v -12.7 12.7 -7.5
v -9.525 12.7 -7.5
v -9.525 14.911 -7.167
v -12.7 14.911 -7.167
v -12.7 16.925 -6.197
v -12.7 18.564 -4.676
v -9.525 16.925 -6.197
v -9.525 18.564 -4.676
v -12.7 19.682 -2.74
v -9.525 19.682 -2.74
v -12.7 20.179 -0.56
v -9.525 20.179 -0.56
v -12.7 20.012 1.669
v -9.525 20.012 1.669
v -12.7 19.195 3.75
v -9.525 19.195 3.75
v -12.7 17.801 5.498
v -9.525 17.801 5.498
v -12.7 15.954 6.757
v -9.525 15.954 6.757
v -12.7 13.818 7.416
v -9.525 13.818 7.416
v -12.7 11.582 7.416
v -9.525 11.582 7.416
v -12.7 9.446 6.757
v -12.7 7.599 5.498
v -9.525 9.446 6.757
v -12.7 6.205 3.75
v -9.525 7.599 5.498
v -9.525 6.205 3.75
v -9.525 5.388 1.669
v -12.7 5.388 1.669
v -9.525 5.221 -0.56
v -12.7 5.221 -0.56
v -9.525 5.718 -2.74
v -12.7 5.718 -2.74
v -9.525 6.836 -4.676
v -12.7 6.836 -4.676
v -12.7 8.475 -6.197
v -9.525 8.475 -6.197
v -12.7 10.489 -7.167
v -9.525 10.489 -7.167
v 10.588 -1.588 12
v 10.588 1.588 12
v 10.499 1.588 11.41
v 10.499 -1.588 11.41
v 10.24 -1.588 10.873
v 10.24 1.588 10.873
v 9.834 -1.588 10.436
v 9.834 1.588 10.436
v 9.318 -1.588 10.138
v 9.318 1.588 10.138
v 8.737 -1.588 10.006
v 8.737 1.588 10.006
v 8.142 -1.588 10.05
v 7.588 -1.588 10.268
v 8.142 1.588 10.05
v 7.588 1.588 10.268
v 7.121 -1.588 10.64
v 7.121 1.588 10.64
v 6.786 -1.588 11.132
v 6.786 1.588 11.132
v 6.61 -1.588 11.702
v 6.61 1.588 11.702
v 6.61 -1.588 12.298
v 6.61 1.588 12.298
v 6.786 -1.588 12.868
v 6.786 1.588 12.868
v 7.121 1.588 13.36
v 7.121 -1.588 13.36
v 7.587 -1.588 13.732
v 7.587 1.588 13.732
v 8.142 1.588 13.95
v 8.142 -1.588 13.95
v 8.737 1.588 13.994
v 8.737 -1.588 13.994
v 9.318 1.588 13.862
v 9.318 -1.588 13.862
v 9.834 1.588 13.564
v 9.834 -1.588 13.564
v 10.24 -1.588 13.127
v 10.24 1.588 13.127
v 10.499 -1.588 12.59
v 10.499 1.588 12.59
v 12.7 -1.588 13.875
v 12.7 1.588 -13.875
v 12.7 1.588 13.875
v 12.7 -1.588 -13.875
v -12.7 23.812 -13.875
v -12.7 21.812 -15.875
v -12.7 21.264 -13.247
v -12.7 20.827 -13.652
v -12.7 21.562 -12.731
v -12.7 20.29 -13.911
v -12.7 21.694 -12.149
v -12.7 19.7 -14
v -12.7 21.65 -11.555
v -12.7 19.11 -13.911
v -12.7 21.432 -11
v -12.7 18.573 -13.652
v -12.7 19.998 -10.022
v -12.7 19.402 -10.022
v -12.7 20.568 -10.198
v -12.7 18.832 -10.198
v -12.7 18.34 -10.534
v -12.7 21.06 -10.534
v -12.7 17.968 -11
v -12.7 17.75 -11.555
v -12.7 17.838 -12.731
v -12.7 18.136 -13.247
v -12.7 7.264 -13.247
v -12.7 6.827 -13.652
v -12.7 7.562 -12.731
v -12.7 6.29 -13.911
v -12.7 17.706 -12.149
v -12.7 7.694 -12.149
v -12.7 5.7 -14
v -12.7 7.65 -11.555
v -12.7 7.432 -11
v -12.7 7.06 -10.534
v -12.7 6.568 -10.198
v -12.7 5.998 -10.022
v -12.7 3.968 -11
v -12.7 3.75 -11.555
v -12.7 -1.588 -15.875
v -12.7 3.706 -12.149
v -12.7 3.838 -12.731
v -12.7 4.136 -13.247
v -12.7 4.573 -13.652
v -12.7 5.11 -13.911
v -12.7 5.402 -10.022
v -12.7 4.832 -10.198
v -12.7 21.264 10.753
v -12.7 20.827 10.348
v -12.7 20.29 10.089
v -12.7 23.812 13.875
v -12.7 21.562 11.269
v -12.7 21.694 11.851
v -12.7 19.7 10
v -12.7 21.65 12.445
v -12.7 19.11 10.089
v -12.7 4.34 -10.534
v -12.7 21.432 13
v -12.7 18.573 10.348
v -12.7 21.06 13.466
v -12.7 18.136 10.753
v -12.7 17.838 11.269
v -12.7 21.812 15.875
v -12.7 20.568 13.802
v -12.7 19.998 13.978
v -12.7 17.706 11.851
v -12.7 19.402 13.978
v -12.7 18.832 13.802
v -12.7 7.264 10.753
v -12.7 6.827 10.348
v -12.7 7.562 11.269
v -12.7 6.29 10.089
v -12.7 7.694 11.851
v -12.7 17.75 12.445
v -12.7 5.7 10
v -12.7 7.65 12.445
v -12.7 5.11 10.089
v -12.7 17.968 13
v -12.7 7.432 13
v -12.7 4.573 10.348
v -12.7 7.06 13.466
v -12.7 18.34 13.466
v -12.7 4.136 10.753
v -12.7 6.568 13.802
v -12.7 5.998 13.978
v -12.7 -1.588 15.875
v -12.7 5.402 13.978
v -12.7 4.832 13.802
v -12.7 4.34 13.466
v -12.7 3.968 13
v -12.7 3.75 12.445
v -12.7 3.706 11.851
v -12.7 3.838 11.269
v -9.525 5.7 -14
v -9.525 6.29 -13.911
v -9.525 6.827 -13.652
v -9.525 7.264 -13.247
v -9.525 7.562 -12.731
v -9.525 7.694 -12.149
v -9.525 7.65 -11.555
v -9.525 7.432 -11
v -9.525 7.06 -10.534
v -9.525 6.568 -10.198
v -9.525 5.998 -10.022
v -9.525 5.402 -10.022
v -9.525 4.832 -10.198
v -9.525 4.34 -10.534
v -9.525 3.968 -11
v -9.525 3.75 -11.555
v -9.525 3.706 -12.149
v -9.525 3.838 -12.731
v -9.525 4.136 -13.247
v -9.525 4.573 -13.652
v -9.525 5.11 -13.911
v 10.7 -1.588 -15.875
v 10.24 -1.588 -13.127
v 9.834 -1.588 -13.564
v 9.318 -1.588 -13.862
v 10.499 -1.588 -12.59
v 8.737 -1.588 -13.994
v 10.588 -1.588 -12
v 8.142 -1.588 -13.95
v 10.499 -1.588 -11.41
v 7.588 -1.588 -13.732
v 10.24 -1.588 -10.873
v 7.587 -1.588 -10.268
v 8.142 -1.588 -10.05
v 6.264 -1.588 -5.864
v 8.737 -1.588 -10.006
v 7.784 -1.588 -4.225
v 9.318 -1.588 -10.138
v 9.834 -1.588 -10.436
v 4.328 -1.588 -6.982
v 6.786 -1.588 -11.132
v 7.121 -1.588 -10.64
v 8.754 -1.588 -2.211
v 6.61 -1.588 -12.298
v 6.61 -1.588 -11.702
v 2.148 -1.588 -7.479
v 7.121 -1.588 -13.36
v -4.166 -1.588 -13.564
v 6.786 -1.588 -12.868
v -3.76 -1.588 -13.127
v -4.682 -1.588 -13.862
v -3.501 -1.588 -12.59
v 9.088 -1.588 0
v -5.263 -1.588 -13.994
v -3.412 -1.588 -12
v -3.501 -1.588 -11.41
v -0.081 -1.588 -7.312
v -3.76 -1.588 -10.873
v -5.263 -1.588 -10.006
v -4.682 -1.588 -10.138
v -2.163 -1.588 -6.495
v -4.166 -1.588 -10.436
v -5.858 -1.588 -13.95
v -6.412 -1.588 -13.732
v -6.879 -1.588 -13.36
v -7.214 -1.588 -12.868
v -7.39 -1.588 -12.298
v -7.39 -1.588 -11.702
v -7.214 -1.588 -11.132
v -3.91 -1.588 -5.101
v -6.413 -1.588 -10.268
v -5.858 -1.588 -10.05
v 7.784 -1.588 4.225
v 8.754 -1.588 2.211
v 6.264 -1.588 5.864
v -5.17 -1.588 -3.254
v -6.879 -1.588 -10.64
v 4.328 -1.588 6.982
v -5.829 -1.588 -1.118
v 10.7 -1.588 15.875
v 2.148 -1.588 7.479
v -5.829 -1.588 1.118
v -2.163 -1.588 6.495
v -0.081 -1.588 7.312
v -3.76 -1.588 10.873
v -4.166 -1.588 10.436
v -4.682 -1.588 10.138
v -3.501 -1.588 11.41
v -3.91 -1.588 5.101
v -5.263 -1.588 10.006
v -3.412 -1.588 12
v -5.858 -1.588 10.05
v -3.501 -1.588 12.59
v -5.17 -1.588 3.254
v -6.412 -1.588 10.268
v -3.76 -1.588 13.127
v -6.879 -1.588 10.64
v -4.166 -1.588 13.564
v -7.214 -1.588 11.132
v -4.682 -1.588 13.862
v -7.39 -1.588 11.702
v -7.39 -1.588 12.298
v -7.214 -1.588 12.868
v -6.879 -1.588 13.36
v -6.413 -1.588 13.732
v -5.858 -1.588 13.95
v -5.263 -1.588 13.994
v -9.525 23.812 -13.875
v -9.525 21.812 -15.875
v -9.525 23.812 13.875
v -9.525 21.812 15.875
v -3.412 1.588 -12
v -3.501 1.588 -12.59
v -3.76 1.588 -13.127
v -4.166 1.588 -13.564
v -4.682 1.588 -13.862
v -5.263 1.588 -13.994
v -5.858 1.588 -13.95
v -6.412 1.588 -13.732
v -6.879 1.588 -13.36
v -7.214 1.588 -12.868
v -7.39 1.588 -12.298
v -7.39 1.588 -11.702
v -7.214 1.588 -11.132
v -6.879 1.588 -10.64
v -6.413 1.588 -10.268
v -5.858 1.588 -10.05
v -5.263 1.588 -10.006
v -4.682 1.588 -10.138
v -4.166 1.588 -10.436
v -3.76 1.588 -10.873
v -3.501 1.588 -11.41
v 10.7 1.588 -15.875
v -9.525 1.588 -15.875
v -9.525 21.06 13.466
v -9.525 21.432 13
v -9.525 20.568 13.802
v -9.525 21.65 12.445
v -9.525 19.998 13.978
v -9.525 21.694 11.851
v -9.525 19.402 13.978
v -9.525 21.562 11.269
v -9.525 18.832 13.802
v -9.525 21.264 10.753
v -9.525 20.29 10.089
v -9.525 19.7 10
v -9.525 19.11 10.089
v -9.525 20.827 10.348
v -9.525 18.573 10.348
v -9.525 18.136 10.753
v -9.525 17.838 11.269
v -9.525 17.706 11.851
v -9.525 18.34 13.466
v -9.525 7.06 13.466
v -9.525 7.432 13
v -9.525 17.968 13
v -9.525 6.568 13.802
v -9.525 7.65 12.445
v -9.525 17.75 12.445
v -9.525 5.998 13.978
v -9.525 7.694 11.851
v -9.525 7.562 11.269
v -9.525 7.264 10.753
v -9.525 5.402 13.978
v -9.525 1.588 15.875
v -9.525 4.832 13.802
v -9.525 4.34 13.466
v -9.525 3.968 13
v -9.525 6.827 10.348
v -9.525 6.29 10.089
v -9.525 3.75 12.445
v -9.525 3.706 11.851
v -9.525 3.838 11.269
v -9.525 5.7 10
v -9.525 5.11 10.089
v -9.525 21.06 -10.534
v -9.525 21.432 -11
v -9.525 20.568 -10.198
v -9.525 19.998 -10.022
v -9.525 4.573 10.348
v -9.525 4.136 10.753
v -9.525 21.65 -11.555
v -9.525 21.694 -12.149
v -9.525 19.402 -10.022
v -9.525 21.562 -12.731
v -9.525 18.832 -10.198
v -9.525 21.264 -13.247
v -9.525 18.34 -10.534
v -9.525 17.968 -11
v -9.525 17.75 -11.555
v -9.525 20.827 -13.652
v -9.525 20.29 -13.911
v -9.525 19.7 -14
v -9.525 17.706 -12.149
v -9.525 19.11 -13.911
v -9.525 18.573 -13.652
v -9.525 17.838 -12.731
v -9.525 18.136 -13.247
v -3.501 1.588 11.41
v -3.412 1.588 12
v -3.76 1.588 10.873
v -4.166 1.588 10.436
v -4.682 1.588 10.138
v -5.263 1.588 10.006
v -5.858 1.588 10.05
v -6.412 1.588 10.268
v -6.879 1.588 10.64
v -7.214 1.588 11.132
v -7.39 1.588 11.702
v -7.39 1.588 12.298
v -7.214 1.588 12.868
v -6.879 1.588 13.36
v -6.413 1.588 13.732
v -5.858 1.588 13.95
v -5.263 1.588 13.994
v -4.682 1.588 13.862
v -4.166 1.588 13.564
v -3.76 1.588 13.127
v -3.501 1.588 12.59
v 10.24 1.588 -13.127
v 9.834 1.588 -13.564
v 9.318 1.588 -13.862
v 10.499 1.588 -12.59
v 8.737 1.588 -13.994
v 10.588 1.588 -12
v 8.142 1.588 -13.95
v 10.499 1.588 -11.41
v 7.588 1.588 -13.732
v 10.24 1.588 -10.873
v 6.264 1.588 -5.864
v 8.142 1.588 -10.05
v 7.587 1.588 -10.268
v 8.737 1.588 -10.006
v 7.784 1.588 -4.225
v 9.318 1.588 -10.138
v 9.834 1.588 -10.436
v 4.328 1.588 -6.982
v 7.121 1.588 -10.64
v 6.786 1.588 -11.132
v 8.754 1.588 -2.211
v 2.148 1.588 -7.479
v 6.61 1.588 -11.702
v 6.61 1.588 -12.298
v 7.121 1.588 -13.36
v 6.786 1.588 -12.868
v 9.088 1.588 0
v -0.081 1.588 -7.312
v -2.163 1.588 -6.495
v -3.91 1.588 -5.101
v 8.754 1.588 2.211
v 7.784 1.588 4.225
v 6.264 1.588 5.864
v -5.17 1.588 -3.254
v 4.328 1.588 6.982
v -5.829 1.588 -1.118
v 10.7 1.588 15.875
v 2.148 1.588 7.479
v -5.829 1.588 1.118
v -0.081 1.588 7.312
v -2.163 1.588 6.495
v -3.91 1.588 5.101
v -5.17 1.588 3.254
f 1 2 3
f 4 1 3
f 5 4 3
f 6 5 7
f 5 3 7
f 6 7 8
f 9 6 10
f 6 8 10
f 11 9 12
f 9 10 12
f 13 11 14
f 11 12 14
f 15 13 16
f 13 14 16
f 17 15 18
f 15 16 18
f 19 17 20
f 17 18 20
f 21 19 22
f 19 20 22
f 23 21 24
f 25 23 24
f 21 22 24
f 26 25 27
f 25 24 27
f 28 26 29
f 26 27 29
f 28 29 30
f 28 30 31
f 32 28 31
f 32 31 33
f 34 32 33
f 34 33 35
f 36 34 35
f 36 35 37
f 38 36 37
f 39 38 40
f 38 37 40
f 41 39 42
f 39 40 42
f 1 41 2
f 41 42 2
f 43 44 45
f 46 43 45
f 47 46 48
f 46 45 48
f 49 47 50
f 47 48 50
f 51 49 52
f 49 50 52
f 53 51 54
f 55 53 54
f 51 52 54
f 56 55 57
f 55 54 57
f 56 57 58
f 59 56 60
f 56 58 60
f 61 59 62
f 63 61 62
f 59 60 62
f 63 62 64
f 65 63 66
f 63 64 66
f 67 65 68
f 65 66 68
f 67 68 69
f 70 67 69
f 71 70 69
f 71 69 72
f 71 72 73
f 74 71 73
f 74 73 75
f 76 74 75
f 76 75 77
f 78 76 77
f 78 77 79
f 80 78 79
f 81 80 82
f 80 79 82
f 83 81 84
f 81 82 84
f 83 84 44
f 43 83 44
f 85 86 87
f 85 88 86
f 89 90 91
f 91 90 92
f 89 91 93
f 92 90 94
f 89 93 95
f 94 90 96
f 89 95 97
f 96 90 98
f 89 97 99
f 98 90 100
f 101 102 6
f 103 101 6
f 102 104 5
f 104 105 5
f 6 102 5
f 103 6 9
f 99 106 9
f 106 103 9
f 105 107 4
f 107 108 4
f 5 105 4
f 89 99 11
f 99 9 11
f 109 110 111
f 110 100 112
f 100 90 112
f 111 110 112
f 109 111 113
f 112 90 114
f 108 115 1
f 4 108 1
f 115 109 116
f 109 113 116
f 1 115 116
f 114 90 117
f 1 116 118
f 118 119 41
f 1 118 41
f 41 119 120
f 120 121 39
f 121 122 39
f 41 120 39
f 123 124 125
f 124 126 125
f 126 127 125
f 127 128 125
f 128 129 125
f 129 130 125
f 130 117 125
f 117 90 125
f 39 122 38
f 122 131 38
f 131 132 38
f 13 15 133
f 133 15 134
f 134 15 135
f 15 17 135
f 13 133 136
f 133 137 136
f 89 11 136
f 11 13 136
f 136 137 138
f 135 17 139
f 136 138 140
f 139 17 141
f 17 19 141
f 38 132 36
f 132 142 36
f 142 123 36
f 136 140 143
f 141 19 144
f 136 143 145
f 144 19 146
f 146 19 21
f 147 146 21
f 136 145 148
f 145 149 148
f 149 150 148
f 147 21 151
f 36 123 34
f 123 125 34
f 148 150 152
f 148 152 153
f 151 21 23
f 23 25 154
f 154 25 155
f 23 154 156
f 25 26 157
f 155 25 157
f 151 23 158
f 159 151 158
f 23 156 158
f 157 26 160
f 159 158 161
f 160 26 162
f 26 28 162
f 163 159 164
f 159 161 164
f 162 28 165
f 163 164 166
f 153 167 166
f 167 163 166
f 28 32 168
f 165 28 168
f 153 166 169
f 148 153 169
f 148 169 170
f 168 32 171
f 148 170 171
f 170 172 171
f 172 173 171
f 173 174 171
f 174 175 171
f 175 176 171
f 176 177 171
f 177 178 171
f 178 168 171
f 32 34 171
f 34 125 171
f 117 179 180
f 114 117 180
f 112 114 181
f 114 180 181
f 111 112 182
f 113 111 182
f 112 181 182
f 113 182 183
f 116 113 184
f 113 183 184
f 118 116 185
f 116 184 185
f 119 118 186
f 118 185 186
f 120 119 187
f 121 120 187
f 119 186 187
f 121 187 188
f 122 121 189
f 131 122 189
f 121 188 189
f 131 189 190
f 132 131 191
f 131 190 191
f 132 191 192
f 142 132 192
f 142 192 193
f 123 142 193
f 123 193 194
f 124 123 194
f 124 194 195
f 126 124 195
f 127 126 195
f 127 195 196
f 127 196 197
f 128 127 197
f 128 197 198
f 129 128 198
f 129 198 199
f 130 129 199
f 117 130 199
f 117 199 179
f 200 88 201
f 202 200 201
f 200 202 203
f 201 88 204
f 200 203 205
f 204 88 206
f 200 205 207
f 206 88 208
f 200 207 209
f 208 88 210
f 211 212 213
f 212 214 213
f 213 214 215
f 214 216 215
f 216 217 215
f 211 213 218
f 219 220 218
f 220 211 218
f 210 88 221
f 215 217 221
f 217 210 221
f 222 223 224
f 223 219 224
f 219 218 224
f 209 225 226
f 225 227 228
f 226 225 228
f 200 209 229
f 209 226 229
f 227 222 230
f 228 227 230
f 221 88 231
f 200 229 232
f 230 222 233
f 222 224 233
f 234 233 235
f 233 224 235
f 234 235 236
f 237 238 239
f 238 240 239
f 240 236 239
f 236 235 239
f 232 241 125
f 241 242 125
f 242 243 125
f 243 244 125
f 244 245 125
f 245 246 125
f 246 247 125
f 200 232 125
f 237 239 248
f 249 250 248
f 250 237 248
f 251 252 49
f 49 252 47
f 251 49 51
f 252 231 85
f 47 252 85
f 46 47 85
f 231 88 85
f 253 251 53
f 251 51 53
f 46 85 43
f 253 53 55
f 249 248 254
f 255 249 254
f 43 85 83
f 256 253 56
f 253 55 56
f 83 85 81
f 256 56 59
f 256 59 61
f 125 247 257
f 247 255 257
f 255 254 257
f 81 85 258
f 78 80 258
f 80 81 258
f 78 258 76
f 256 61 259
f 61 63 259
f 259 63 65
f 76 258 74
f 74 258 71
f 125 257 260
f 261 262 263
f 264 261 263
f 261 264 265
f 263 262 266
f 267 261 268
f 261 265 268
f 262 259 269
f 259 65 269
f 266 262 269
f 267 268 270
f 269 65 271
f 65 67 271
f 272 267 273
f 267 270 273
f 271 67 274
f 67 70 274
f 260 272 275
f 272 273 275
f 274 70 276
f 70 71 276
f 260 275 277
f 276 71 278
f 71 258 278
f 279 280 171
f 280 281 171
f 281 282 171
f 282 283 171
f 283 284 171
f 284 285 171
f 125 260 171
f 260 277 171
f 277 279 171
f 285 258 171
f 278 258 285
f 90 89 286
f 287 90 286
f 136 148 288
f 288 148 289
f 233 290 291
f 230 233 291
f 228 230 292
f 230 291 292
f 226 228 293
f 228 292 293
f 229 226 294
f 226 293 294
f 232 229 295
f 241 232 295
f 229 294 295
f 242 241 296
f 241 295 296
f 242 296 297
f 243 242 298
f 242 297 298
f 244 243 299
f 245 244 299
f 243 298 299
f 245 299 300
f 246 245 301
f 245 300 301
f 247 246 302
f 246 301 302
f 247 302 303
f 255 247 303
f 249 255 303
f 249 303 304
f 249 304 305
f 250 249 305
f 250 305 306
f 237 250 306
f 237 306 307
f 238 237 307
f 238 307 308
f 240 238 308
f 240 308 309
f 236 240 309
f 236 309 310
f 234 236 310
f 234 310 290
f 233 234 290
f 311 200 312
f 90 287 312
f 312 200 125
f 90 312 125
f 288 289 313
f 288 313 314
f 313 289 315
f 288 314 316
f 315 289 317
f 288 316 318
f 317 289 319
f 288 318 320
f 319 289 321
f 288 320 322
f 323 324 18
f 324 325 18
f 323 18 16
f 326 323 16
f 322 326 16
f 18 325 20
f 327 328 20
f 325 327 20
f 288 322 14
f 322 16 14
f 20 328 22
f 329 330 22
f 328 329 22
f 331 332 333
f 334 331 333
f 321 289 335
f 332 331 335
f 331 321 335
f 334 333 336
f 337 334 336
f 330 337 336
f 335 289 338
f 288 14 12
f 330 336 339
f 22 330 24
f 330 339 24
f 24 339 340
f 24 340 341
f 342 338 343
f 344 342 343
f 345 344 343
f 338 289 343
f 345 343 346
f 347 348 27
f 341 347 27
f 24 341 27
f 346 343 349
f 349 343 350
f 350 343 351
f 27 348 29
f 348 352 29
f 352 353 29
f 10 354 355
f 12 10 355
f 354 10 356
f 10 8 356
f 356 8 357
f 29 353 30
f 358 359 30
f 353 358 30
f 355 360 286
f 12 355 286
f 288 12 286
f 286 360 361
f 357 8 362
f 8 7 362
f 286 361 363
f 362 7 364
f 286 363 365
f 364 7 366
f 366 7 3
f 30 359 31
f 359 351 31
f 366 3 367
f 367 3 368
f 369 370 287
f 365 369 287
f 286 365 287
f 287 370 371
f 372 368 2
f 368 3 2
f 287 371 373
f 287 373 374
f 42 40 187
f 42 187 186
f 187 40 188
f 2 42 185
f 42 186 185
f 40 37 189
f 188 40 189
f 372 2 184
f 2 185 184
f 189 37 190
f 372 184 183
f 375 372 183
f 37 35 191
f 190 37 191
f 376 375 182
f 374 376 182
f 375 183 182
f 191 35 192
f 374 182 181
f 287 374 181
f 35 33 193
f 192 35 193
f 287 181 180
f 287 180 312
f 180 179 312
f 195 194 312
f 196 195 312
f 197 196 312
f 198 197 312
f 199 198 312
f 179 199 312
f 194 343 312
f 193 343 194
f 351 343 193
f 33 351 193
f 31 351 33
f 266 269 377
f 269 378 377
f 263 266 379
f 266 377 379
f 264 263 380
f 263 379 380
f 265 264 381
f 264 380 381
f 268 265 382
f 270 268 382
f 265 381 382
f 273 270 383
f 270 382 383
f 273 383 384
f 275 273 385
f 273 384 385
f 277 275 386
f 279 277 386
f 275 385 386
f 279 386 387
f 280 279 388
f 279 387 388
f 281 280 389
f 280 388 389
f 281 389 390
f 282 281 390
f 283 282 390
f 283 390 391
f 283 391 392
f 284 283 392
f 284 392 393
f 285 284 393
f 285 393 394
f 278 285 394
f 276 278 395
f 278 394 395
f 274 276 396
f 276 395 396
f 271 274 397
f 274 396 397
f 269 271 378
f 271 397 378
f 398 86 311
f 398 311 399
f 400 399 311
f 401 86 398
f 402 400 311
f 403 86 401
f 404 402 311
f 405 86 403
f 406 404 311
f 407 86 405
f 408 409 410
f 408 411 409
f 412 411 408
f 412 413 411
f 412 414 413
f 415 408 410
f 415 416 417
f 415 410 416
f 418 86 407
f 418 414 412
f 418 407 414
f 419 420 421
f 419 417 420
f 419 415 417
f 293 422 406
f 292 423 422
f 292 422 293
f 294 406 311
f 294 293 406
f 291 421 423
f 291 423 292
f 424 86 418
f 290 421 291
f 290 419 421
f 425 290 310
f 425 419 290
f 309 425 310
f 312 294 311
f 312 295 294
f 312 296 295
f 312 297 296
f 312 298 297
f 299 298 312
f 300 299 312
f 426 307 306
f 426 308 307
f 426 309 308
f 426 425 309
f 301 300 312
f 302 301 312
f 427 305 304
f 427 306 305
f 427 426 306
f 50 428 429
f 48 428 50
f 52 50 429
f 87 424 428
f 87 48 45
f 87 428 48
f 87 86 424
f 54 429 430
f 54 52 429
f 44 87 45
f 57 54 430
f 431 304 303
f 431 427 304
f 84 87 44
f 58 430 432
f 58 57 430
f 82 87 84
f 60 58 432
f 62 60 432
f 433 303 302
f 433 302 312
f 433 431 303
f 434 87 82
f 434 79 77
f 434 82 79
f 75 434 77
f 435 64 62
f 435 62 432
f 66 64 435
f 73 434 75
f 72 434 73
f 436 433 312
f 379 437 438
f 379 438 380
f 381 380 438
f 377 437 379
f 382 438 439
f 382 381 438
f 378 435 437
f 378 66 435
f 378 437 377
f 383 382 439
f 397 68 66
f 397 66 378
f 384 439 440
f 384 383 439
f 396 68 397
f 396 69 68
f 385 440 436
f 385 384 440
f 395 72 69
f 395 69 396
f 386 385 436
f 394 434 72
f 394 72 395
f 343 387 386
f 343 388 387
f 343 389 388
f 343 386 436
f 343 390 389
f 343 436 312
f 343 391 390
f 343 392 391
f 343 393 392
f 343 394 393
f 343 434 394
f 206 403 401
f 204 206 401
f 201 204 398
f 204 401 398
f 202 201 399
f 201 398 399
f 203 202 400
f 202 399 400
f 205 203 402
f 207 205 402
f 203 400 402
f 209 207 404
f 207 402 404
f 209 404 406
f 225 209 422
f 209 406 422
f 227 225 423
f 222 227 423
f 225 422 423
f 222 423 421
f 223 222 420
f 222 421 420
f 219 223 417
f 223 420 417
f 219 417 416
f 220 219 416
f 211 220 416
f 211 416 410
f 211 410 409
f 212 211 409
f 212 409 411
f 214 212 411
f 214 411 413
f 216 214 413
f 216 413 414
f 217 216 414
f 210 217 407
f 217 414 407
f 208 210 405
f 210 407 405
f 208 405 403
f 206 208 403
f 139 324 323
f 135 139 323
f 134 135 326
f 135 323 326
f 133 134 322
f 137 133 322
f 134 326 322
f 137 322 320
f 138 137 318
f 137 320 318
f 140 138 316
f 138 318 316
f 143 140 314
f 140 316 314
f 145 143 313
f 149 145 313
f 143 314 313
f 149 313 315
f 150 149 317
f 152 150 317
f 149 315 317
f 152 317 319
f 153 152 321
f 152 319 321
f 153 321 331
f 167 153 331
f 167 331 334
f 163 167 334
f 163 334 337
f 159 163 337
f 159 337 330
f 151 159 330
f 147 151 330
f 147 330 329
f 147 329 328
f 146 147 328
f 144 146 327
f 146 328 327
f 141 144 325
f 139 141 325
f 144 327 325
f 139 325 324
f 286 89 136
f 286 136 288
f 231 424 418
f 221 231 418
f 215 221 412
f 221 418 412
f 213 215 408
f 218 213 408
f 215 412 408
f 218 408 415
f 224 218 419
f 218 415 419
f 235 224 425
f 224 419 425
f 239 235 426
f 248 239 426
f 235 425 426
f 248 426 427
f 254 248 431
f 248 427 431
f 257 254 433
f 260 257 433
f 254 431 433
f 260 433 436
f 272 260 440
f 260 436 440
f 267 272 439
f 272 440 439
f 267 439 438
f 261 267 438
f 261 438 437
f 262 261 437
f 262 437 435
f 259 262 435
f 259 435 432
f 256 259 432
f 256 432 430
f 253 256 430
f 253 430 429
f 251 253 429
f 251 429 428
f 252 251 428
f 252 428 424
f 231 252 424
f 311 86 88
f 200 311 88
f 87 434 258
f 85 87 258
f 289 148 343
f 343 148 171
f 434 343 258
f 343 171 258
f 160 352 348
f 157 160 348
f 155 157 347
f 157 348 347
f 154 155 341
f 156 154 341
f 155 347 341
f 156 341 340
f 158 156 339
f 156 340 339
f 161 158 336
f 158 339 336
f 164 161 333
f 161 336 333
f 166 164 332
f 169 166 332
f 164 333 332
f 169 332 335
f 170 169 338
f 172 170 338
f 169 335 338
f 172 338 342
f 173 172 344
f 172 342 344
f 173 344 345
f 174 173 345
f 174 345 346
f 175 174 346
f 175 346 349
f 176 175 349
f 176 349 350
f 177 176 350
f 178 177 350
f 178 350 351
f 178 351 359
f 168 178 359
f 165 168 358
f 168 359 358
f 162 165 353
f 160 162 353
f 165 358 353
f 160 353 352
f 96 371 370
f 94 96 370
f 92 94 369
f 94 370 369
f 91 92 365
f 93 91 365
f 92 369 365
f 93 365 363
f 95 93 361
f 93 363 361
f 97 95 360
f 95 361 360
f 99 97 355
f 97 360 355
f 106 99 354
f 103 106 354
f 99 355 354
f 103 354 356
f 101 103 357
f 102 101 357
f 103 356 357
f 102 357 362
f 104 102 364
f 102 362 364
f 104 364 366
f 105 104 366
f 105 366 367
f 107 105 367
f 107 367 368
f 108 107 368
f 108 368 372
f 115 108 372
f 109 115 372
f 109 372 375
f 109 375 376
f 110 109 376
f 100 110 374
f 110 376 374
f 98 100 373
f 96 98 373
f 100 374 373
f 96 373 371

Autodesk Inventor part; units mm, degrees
ref_plane "YZ Plane" through (0, 0, 0) normal (1, 0, 0) x (0, 1, 0)
ref_plane "XZ Plane" through (0, 0, 0) normal (0, 1, 0) x (-1, 0, 0)
ref_plane "XY Plane" through (0, 0, 0) normal (0, 0, 1) x (1, 0, 0)
sketch "Sketch1" plane through (0, 0, 0) normal (0, 1, 0) x (-1, 0, 0)
  line L0 (-12.7, 15.875) -> (12.7, 15.875)
  line L1 (12.7, 15.875) -> (12.7, -15.875)
  line L2 (12.7, -15.875) -> (-12.7, -15.875)
  line L3 (-12.7, -15.875) -> (-12.7, 15.875)
  line L4 (-12.7, 15.875) -> (12.7, -15.875) construction
  line L5 (12.7, 15.875) -> (-12.7, -15.875) construction
  point P0 (0, 0)
  dimension "d0" = 25.4
  dimension "d1" = 31.75
extrude "Extrusion1" add sketch "Sketch1" along normal mid plane 3.175
sketch "Sketch2" plane through (0, 1.5875, 0) normal (0, 1, 0) x (1, 0, 0)
  line L0 (-12.7, 15.875) -> (-12.7, -15.875) projected
  line L1 (-12.7, -15.875) -> (-9.525, -15.875)
  line L2 (-9.525, -15.875) -> (-9.525, 15.875)
  line L3 (-9.525, 15.875) -> (-12.7, 15.875)
  line L4 (-12.7, 15.875) -> (-12.7, -15.875)
  line L5 (12.7, 15.875) -> (-12.7, 15.875) projected
  point P0 (0, 0)
  point P1 (-12.7, 15.875)
  dimension "d4" = 3.175
extrude "Extrusion2" add sketch "Sketch2" along normal blind 22.225
sketch "Sketch3" plane through (0, 1.5875, 0) normal (0, 1, 0) x (1, 0, 0)
  line L0 (-9.525, -15.875) -> (12.7, -15.875) construction
  line L1 (12.7, 15.875) -> (-9.525, 15.875) construction
  line L2 (-9.525, 15.875) -> (-9.525, -15.875) construction
  line L3 (-9.525, -15.875) -> (12.7, -15.875) projected
  line L4 (12.7, -15.875) -> (12.7, 15.875) construction
  line L5 (12.7, 15.875) -> (-9.525, 15.875) projected
  line L6 (1.5875, 15.875) -> (1.5875, -15.875) construction
  line L7 (12.7, -15.875) -> (-12.7, -15.875) projected
  line L8 (12.7, 0) -> (-9.525, 0) construction
  circle A0 centre (1.5875, 0) radius 7.5
  circle A1 centre (-5.4125, -12) radius 2
  circle A2 centre (-5.4125, 12) radius 2
  circle A3 centre (8.5875, -12) radius 2
  circle A4 centre (8.5875, 12) radius 2
  circle A5 centre (1.5875, 0) radius 8.5 construction
  circle A6 centre (-5.4125, -12) radius 3.5 construction
  point P0 (0, 0)
  dimension "d8" = 15
  dimension "d11" = 4
  dimension "d12" = 7
  dimension "d13" = 12
  dimension "d16" = 17
  dimension "d17" = 7
extrude "Extrusion3" cut sketch "Sketch3" against normal up to surface (3.175 mm away)
sketch "Sketch4" plane through (-9.525, 1.5875, 15.875) normal (1, 0, 0) x (0, 0, -1)
  line L0 (31.75, 0) -> (0, 0) construction
  line L1 (31.75, 0) -> (31.75, 22.225) construction
  line L2 (0, 22.225) -> (31.75, 22.225) construction
  line L3 (0, 0) -> (0, 22.225) construction
  line L4 (0, 11.1125) -> (31.75, 11.1125) construction
  line L5 (15.875, 22.225) -> (15.875, 0) construction
  circle A0 centre (15.875, 11.1125) radius 7.5
  circle A1 centre (3.875, 18.1125) radius 2
  circle A2 centre (3.875, 4.1125) radius 2
  circle A3 centre (27.875, 18.1125) radius 2
  circle A4 centre (27.875, 4.1125) radius 2
  point P0 (15.875, -1.5875)
  dimension "d18" = 15
  dimension "d19" = 4
  dimension "d20" = 12
  dimension "d21" = 7
extrude "Extrusion4" cut sketch "Sketch4" against normal up to surface (3.175 mm away)
chamfer "Chamfer1" distance 2 angle 45 4 edges at (12.7, 0, 15.875) (12.7, 0, -15.875) (-11.1125, 23.8125, -15.875) (-11.1125, 23.8125, 15.875)
properties part number "Custom L Bracket"
